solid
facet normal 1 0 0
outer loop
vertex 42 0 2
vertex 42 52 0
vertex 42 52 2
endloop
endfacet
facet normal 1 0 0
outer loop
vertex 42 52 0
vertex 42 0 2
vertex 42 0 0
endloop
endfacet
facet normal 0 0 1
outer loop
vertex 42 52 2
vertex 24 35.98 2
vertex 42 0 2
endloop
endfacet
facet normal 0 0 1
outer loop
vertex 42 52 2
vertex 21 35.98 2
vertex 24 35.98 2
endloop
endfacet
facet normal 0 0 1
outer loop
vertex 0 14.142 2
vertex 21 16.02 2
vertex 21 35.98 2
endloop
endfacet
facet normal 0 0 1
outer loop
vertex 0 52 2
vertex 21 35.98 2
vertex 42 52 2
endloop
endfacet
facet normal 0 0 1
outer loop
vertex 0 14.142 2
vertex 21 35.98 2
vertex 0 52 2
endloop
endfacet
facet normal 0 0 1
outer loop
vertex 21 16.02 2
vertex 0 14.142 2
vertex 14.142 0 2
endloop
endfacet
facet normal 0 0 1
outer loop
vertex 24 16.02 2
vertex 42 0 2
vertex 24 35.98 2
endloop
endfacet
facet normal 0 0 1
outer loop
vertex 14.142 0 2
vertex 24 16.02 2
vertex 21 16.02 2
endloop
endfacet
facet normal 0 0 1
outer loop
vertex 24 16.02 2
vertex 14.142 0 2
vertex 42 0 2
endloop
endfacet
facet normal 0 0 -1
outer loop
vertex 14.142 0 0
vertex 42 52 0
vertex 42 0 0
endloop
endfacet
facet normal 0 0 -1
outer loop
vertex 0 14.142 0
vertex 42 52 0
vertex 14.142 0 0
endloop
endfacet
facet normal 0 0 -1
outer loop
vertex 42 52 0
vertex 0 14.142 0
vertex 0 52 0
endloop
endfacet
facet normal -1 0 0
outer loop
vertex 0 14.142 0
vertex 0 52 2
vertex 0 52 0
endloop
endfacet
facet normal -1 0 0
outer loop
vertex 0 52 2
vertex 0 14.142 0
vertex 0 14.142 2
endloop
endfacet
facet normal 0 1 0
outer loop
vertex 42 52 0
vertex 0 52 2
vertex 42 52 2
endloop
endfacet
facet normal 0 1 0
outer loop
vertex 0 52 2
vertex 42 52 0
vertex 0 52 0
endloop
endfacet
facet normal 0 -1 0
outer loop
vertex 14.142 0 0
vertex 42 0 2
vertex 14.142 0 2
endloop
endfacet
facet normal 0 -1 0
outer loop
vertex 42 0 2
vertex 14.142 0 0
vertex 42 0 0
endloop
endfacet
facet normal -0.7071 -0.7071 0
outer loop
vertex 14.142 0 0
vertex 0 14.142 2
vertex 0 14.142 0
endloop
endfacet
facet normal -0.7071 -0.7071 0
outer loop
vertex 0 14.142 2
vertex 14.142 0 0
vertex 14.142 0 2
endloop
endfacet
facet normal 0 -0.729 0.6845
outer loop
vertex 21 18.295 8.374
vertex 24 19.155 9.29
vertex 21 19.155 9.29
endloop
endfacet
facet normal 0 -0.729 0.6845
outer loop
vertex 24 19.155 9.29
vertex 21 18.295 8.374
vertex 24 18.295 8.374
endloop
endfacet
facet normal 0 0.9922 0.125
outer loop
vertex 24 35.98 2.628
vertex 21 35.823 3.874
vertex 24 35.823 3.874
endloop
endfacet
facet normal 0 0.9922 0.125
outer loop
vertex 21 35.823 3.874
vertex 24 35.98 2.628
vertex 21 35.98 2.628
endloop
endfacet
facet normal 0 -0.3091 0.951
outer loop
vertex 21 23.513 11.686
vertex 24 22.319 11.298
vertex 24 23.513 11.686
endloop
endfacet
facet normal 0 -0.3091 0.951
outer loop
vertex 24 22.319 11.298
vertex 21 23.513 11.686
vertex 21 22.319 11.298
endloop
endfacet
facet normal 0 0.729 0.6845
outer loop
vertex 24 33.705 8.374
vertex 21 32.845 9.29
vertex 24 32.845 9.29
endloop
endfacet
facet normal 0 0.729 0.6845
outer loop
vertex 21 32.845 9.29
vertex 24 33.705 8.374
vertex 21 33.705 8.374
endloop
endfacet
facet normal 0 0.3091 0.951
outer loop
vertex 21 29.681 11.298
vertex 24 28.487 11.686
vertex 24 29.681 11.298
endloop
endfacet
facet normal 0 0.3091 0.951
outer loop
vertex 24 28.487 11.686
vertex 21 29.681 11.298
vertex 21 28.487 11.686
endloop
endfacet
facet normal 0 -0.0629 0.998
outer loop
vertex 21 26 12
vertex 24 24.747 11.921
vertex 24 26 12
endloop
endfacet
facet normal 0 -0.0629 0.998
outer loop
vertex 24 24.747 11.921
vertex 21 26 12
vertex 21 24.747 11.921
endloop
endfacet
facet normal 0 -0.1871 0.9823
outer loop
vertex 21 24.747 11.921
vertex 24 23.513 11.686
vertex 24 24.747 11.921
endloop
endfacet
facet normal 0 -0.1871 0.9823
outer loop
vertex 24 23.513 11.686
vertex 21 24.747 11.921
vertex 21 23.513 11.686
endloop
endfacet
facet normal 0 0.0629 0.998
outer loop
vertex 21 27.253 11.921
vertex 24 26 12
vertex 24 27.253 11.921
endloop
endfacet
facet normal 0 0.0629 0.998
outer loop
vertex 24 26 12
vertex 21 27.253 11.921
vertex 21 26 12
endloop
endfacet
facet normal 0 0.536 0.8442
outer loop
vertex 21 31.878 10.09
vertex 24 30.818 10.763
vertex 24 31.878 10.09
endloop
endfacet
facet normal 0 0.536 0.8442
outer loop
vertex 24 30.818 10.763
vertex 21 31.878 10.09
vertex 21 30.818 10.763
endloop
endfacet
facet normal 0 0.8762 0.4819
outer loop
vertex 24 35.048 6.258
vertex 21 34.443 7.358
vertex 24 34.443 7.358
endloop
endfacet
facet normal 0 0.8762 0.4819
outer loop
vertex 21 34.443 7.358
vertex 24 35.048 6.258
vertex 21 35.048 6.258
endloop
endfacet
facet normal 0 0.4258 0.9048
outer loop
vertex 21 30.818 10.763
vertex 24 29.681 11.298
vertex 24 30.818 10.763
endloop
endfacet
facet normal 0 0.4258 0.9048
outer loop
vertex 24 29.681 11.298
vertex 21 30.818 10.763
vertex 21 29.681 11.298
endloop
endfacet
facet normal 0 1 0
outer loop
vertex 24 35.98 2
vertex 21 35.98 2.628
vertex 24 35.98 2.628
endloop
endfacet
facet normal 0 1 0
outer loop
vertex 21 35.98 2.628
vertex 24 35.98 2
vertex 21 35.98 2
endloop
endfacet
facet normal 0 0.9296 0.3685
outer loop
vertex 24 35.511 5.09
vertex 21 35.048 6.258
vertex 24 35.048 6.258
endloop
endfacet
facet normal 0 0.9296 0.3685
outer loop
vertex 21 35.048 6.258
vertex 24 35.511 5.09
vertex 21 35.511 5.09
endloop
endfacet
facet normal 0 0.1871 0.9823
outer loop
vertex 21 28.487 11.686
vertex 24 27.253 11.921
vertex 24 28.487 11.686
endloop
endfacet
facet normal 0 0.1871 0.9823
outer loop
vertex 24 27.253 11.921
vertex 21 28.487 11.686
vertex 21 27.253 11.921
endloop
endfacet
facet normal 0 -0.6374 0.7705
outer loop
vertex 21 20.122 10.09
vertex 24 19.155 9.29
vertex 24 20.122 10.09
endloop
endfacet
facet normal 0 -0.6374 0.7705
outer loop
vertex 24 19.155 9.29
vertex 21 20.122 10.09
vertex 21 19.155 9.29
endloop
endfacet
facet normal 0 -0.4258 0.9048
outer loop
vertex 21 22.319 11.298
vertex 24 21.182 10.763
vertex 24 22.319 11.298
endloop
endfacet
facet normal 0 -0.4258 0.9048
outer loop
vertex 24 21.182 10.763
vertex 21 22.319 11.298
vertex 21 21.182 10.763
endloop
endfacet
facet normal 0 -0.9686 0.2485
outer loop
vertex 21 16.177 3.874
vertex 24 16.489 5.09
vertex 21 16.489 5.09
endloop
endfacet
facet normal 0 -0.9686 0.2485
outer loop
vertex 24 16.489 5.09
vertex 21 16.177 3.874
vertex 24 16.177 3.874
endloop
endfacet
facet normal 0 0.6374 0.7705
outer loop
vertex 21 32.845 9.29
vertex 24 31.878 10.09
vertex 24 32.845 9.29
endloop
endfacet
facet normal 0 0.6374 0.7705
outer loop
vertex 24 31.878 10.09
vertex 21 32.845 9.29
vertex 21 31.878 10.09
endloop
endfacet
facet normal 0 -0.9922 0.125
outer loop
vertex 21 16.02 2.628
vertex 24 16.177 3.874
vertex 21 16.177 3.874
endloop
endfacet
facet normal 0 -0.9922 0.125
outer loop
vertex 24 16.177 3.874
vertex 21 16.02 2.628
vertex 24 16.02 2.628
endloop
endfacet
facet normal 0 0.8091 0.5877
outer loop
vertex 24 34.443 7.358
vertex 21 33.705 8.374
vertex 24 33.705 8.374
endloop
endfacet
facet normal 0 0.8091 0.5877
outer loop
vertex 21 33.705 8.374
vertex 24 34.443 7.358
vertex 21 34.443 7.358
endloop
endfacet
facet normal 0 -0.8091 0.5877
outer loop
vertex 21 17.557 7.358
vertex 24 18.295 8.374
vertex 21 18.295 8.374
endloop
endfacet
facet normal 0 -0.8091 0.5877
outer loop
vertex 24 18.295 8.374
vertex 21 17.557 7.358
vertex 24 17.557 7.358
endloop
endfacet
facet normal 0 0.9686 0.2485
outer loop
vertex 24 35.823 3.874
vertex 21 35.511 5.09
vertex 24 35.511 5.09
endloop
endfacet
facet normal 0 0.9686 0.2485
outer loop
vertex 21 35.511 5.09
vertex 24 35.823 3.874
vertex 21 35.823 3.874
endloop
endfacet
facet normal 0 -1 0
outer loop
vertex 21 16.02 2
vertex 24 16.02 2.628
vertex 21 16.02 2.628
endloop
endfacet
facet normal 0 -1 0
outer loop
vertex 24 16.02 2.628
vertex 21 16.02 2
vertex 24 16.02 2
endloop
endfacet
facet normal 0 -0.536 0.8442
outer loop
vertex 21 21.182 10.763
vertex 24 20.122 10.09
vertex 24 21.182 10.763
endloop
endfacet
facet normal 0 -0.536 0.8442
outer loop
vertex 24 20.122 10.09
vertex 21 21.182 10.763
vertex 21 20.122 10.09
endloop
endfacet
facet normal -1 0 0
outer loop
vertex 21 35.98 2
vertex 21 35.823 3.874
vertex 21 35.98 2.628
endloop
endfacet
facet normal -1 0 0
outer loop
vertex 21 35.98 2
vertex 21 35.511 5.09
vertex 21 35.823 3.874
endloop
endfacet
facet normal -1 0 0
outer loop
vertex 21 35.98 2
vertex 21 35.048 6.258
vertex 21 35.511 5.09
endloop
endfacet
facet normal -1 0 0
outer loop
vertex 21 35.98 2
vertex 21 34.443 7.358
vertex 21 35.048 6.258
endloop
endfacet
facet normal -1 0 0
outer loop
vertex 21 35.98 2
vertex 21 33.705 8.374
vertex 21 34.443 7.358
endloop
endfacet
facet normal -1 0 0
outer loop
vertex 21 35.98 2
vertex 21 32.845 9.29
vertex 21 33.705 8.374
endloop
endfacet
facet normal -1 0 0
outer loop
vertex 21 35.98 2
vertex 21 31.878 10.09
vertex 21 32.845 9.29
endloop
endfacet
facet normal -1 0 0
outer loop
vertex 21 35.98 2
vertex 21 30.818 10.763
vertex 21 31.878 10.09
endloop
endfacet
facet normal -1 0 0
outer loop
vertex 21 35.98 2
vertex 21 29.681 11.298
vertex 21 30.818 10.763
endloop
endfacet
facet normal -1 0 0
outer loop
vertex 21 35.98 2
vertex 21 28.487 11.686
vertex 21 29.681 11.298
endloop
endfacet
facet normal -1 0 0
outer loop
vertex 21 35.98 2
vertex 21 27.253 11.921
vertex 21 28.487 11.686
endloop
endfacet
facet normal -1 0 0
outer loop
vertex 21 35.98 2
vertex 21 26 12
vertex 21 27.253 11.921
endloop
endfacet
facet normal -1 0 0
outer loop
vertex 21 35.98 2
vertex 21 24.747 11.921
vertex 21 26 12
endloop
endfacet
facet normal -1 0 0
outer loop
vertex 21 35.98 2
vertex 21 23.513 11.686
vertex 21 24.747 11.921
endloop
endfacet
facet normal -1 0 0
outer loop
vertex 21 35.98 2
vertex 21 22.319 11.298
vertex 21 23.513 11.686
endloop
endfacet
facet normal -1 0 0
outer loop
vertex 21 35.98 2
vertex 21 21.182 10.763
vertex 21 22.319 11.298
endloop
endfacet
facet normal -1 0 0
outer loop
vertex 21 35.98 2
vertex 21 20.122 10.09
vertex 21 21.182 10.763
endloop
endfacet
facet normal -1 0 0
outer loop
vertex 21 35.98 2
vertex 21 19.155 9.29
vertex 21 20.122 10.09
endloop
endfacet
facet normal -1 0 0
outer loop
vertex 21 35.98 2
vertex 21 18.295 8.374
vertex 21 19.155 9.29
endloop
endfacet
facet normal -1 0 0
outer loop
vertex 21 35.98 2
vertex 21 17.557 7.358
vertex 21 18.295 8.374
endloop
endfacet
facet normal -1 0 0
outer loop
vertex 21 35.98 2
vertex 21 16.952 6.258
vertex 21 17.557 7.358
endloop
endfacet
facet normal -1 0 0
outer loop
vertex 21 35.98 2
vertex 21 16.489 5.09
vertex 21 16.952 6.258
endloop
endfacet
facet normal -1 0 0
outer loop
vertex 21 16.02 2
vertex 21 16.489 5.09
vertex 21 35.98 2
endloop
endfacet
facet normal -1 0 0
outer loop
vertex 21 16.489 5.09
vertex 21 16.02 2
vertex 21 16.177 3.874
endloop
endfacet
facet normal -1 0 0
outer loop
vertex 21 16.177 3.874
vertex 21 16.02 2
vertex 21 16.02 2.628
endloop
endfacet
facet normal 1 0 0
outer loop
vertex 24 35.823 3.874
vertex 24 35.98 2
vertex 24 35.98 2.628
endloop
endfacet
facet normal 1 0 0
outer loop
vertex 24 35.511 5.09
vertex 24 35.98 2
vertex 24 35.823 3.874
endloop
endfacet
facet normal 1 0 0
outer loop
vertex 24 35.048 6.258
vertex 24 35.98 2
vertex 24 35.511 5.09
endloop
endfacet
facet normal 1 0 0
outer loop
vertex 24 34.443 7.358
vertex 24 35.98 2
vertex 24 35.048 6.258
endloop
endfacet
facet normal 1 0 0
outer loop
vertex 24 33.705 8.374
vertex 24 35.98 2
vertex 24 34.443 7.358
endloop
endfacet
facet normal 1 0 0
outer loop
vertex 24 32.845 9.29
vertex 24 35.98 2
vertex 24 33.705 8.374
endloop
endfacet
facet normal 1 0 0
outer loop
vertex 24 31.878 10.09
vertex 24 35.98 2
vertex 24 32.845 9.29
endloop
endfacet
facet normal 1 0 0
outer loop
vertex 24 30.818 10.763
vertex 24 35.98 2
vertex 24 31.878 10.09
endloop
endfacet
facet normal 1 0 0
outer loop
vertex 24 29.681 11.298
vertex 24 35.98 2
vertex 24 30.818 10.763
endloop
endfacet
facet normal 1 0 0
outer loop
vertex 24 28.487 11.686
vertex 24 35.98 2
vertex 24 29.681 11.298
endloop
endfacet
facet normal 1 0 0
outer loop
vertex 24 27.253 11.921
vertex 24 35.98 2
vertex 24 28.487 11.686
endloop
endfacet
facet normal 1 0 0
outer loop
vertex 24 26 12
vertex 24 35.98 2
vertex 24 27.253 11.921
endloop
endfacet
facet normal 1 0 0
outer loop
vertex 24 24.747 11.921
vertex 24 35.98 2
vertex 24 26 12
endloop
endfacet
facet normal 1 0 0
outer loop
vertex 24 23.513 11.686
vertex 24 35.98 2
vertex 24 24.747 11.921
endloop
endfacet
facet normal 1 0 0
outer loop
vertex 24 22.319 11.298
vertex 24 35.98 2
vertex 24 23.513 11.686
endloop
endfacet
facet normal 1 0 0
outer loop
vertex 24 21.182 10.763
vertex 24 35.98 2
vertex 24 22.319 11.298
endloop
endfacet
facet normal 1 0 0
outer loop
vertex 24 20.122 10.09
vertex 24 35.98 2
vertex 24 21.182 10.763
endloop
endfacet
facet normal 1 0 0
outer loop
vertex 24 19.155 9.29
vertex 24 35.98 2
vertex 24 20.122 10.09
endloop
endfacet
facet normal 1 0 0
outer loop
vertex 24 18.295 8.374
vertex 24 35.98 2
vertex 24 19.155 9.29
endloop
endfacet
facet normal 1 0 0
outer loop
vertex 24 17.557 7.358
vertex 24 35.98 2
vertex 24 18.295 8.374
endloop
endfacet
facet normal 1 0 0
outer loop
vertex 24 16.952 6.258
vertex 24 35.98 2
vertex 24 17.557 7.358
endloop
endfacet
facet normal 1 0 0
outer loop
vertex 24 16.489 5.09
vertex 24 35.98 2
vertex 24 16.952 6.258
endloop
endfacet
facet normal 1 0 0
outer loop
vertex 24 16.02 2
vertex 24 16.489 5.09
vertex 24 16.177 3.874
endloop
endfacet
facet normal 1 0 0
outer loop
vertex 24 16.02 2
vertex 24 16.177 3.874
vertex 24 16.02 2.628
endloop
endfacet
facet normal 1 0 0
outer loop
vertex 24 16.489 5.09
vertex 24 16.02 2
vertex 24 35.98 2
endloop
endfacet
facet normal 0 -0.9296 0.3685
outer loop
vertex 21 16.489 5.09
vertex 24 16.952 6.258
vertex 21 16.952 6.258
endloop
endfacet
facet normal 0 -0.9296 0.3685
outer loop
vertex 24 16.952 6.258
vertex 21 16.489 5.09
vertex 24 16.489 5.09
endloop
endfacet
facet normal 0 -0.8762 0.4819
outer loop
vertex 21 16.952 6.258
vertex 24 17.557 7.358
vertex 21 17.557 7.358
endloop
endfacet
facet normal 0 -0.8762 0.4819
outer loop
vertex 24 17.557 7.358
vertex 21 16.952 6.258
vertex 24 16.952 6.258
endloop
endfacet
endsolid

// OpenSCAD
// Wash Chamber V4
// Jeffery Moffitt
// jeffmoffitt@gmail.com
// December 22, 2015//Modified January 26, 2016//Modified February 11, 2016//Modified February 26, 2016

module catch() {
    cube(size=([9,3,3]));
    translate([3,0,-3])cube(size=([3,3,3]));
}
//catch();

module case() {
    difference(){
        translate([0,0,0])cube(size=([49, 59, 50])); //Outside box 99
        translate([3,3,3])cube(size=([43, 53, 48])); // Inside 93
    }
    //Add ribs
    for (pos=[3:5:54]){
        union(){
            translate([0, pos, 0])cube(size=([7,3,43]));
            translate([42, pos, 0])cube(size=([7,3,43]));
        }
    }
   //Add lid holder and symmetry breaking mark
    translate([49/2-9/2,59,42*3/4-3/2])catch();
    translate([0,59/2-9/2,42*3/4-3/2])rotate([0,0,90])catch();
    translate([52,59/2-9/2,42*3/4-3/2])rotate([0,0,90])catch();
}
//case();

module coverslip(){
    translate([4.5,0,0])rotate([0,90,0])cylinder(h=1, r=20, $fn=500);
}
//coverslip();

module latch(){
    union(){
        cube(size=([2, 1, 42/4 + 3/2 + 5]));
        translate([0,-1, 0])cube(size=([2, 1, 1.5]));
    }
} 
//latch();

module cover(){
    union(){//Add latches
        difference(){ //Create top plate
            cube(size=([42, 52, 2]));
            rotate([0,0,45])translate([-10,-10,-.5])cube(size=([20,20,3]));
        }
        translate([21,26,2])difference(){ //Create handle
            rotate([0,90,0])cylinder(h=3, r=10, $fn=50);
            translate([-1,-10,-20])cube(size=([5,20,20]));
        }
    }  
}
//translate([0,0,45])color("red")cover();

module washcontainer(){
    translate([25, 30, 0])difference(){
        cylinder(h=50,r=42, $fn=500);
        translate([0,0,-1])cylinder(h=52,r=40,$fn=500);
    }
}
//washcontainer();

//case();
//translate([25,2,23])rotate([0,0,90])coverslip();
//washcontainer();
//translate([3.5,3.5,50])color("red")cover();
cover();
